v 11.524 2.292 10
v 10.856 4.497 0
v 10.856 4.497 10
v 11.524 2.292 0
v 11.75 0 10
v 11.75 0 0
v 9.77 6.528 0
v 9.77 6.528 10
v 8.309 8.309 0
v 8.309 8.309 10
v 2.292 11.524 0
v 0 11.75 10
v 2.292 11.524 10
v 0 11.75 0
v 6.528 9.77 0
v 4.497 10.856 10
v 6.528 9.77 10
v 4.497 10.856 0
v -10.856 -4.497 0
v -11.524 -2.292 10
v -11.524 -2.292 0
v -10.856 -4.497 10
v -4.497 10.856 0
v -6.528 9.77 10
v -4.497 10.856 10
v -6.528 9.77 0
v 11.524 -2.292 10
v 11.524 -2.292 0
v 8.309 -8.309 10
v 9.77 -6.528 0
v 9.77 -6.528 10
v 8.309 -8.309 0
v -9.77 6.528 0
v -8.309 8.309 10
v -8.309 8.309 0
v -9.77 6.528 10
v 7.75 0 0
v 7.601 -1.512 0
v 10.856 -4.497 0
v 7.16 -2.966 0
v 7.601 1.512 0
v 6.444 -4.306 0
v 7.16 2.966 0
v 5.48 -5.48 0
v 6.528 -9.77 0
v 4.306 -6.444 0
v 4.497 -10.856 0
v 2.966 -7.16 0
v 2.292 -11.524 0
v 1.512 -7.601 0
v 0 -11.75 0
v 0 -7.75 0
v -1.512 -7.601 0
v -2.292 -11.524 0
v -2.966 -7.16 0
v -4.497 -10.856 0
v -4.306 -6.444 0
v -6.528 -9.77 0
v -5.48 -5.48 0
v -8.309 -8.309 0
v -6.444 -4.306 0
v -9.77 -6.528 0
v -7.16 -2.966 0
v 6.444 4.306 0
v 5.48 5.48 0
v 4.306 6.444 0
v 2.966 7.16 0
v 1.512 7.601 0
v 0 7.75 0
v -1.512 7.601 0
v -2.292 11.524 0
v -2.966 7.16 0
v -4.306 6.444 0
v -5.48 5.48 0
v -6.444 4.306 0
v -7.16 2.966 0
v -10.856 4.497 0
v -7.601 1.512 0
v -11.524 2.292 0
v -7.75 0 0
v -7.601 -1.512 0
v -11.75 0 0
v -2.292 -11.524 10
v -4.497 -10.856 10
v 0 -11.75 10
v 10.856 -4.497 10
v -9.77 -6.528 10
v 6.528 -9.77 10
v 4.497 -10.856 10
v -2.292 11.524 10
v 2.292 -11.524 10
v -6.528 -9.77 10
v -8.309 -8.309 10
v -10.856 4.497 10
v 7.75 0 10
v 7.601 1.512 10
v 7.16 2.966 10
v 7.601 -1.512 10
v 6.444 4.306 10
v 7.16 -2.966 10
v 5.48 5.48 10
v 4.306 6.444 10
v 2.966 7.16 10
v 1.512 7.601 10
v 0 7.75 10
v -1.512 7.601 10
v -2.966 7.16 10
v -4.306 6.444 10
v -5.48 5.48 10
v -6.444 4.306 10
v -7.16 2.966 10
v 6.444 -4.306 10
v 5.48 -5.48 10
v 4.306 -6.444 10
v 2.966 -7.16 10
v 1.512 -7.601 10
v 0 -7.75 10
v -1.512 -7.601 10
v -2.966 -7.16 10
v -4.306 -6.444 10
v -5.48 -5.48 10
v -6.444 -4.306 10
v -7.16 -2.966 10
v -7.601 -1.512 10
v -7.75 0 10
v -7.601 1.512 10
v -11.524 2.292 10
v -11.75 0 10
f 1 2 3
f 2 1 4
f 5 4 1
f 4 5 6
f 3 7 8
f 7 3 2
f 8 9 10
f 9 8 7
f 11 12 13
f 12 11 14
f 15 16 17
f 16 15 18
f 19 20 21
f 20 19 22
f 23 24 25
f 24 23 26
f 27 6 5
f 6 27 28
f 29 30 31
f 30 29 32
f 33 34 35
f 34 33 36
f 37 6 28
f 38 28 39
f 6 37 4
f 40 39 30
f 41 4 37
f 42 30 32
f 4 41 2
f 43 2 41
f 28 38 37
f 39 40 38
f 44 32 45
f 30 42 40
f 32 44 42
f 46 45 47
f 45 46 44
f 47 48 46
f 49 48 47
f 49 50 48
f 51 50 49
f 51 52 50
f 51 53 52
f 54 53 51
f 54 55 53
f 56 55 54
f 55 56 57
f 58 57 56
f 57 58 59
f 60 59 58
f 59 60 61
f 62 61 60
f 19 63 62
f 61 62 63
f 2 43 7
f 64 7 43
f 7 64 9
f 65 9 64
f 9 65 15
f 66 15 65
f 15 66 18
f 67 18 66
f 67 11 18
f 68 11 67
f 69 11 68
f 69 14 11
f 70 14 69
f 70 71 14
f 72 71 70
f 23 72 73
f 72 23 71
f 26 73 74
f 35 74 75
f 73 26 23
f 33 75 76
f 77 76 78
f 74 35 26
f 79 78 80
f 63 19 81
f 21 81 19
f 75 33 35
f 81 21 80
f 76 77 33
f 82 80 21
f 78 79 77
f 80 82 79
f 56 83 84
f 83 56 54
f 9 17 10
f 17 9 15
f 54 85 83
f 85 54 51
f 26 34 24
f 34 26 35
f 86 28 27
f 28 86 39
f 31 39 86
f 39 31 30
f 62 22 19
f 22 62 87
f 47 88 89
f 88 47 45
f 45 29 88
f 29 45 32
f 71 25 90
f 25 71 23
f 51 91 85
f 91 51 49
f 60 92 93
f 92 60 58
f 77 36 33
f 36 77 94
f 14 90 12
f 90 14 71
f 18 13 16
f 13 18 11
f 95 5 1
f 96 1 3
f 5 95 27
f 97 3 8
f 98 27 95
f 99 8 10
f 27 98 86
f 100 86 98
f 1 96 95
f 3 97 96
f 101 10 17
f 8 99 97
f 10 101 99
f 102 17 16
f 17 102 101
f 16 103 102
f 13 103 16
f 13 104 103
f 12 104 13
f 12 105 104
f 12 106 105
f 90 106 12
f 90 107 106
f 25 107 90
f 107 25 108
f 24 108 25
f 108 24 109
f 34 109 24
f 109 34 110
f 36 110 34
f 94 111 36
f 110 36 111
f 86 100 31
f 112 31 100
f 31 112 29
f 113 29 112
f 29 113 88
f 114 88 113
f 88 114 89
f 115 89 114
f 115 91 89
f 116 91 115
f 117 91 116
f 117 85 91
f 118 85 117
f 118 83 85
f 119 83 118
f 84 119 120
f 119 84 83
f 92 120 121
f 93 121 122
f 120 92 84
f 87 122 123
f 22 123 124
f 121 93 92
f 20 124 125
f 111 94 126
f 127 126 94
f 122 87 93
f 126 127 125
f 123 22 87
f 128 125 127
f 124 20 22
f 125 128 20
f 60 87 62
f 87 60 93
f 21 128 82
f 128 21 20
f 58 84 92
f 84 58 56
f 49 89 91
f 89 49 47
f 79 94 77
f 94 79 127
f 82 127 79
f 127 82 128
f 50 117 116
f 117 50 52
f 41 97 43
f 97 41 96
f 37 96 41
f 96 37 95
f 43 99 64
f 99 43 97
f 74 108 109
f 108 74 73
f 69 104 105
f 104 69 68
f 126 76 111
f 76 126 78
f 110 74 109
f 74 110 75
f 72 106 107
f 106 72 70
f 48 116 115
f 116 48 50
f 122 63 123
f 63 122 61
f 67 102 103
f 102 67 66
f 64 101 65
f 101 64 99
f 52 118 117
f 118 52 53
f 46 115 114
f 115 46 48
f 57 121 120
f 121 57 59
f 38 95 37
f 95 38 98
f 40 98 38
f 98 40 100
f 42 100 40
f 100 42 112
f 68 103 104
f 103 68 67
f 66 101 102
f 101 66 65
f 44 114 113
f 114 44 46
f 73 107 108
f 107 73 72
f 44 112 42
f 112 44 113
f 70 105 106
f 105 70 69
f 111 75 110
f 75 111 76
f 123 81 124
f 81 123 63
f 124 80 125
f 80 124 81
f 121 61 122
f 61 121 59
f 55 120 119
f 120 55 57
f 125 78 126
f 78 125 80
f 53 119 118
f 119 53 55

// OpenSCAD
$fn = 32;

// ----------------------------------------------------------------------
// Spacer sleeve: 23.5 / 15.5 x 10 mm
// ----------------------------------------------------------------------

// --- parameters (mm) ---
tube_d = 23.5;            // outside diameter
bore_d = 15.5;            // shaft bore
tube_l = 10;              // sleeve length

module sleeve() {
  cylinder(h = tube_l, d = tube_d);
}

difference() {
  sleeve();
  translate([0, 0, -1]) cylinder(h = tube_l + 2, d = bore_d);
}
